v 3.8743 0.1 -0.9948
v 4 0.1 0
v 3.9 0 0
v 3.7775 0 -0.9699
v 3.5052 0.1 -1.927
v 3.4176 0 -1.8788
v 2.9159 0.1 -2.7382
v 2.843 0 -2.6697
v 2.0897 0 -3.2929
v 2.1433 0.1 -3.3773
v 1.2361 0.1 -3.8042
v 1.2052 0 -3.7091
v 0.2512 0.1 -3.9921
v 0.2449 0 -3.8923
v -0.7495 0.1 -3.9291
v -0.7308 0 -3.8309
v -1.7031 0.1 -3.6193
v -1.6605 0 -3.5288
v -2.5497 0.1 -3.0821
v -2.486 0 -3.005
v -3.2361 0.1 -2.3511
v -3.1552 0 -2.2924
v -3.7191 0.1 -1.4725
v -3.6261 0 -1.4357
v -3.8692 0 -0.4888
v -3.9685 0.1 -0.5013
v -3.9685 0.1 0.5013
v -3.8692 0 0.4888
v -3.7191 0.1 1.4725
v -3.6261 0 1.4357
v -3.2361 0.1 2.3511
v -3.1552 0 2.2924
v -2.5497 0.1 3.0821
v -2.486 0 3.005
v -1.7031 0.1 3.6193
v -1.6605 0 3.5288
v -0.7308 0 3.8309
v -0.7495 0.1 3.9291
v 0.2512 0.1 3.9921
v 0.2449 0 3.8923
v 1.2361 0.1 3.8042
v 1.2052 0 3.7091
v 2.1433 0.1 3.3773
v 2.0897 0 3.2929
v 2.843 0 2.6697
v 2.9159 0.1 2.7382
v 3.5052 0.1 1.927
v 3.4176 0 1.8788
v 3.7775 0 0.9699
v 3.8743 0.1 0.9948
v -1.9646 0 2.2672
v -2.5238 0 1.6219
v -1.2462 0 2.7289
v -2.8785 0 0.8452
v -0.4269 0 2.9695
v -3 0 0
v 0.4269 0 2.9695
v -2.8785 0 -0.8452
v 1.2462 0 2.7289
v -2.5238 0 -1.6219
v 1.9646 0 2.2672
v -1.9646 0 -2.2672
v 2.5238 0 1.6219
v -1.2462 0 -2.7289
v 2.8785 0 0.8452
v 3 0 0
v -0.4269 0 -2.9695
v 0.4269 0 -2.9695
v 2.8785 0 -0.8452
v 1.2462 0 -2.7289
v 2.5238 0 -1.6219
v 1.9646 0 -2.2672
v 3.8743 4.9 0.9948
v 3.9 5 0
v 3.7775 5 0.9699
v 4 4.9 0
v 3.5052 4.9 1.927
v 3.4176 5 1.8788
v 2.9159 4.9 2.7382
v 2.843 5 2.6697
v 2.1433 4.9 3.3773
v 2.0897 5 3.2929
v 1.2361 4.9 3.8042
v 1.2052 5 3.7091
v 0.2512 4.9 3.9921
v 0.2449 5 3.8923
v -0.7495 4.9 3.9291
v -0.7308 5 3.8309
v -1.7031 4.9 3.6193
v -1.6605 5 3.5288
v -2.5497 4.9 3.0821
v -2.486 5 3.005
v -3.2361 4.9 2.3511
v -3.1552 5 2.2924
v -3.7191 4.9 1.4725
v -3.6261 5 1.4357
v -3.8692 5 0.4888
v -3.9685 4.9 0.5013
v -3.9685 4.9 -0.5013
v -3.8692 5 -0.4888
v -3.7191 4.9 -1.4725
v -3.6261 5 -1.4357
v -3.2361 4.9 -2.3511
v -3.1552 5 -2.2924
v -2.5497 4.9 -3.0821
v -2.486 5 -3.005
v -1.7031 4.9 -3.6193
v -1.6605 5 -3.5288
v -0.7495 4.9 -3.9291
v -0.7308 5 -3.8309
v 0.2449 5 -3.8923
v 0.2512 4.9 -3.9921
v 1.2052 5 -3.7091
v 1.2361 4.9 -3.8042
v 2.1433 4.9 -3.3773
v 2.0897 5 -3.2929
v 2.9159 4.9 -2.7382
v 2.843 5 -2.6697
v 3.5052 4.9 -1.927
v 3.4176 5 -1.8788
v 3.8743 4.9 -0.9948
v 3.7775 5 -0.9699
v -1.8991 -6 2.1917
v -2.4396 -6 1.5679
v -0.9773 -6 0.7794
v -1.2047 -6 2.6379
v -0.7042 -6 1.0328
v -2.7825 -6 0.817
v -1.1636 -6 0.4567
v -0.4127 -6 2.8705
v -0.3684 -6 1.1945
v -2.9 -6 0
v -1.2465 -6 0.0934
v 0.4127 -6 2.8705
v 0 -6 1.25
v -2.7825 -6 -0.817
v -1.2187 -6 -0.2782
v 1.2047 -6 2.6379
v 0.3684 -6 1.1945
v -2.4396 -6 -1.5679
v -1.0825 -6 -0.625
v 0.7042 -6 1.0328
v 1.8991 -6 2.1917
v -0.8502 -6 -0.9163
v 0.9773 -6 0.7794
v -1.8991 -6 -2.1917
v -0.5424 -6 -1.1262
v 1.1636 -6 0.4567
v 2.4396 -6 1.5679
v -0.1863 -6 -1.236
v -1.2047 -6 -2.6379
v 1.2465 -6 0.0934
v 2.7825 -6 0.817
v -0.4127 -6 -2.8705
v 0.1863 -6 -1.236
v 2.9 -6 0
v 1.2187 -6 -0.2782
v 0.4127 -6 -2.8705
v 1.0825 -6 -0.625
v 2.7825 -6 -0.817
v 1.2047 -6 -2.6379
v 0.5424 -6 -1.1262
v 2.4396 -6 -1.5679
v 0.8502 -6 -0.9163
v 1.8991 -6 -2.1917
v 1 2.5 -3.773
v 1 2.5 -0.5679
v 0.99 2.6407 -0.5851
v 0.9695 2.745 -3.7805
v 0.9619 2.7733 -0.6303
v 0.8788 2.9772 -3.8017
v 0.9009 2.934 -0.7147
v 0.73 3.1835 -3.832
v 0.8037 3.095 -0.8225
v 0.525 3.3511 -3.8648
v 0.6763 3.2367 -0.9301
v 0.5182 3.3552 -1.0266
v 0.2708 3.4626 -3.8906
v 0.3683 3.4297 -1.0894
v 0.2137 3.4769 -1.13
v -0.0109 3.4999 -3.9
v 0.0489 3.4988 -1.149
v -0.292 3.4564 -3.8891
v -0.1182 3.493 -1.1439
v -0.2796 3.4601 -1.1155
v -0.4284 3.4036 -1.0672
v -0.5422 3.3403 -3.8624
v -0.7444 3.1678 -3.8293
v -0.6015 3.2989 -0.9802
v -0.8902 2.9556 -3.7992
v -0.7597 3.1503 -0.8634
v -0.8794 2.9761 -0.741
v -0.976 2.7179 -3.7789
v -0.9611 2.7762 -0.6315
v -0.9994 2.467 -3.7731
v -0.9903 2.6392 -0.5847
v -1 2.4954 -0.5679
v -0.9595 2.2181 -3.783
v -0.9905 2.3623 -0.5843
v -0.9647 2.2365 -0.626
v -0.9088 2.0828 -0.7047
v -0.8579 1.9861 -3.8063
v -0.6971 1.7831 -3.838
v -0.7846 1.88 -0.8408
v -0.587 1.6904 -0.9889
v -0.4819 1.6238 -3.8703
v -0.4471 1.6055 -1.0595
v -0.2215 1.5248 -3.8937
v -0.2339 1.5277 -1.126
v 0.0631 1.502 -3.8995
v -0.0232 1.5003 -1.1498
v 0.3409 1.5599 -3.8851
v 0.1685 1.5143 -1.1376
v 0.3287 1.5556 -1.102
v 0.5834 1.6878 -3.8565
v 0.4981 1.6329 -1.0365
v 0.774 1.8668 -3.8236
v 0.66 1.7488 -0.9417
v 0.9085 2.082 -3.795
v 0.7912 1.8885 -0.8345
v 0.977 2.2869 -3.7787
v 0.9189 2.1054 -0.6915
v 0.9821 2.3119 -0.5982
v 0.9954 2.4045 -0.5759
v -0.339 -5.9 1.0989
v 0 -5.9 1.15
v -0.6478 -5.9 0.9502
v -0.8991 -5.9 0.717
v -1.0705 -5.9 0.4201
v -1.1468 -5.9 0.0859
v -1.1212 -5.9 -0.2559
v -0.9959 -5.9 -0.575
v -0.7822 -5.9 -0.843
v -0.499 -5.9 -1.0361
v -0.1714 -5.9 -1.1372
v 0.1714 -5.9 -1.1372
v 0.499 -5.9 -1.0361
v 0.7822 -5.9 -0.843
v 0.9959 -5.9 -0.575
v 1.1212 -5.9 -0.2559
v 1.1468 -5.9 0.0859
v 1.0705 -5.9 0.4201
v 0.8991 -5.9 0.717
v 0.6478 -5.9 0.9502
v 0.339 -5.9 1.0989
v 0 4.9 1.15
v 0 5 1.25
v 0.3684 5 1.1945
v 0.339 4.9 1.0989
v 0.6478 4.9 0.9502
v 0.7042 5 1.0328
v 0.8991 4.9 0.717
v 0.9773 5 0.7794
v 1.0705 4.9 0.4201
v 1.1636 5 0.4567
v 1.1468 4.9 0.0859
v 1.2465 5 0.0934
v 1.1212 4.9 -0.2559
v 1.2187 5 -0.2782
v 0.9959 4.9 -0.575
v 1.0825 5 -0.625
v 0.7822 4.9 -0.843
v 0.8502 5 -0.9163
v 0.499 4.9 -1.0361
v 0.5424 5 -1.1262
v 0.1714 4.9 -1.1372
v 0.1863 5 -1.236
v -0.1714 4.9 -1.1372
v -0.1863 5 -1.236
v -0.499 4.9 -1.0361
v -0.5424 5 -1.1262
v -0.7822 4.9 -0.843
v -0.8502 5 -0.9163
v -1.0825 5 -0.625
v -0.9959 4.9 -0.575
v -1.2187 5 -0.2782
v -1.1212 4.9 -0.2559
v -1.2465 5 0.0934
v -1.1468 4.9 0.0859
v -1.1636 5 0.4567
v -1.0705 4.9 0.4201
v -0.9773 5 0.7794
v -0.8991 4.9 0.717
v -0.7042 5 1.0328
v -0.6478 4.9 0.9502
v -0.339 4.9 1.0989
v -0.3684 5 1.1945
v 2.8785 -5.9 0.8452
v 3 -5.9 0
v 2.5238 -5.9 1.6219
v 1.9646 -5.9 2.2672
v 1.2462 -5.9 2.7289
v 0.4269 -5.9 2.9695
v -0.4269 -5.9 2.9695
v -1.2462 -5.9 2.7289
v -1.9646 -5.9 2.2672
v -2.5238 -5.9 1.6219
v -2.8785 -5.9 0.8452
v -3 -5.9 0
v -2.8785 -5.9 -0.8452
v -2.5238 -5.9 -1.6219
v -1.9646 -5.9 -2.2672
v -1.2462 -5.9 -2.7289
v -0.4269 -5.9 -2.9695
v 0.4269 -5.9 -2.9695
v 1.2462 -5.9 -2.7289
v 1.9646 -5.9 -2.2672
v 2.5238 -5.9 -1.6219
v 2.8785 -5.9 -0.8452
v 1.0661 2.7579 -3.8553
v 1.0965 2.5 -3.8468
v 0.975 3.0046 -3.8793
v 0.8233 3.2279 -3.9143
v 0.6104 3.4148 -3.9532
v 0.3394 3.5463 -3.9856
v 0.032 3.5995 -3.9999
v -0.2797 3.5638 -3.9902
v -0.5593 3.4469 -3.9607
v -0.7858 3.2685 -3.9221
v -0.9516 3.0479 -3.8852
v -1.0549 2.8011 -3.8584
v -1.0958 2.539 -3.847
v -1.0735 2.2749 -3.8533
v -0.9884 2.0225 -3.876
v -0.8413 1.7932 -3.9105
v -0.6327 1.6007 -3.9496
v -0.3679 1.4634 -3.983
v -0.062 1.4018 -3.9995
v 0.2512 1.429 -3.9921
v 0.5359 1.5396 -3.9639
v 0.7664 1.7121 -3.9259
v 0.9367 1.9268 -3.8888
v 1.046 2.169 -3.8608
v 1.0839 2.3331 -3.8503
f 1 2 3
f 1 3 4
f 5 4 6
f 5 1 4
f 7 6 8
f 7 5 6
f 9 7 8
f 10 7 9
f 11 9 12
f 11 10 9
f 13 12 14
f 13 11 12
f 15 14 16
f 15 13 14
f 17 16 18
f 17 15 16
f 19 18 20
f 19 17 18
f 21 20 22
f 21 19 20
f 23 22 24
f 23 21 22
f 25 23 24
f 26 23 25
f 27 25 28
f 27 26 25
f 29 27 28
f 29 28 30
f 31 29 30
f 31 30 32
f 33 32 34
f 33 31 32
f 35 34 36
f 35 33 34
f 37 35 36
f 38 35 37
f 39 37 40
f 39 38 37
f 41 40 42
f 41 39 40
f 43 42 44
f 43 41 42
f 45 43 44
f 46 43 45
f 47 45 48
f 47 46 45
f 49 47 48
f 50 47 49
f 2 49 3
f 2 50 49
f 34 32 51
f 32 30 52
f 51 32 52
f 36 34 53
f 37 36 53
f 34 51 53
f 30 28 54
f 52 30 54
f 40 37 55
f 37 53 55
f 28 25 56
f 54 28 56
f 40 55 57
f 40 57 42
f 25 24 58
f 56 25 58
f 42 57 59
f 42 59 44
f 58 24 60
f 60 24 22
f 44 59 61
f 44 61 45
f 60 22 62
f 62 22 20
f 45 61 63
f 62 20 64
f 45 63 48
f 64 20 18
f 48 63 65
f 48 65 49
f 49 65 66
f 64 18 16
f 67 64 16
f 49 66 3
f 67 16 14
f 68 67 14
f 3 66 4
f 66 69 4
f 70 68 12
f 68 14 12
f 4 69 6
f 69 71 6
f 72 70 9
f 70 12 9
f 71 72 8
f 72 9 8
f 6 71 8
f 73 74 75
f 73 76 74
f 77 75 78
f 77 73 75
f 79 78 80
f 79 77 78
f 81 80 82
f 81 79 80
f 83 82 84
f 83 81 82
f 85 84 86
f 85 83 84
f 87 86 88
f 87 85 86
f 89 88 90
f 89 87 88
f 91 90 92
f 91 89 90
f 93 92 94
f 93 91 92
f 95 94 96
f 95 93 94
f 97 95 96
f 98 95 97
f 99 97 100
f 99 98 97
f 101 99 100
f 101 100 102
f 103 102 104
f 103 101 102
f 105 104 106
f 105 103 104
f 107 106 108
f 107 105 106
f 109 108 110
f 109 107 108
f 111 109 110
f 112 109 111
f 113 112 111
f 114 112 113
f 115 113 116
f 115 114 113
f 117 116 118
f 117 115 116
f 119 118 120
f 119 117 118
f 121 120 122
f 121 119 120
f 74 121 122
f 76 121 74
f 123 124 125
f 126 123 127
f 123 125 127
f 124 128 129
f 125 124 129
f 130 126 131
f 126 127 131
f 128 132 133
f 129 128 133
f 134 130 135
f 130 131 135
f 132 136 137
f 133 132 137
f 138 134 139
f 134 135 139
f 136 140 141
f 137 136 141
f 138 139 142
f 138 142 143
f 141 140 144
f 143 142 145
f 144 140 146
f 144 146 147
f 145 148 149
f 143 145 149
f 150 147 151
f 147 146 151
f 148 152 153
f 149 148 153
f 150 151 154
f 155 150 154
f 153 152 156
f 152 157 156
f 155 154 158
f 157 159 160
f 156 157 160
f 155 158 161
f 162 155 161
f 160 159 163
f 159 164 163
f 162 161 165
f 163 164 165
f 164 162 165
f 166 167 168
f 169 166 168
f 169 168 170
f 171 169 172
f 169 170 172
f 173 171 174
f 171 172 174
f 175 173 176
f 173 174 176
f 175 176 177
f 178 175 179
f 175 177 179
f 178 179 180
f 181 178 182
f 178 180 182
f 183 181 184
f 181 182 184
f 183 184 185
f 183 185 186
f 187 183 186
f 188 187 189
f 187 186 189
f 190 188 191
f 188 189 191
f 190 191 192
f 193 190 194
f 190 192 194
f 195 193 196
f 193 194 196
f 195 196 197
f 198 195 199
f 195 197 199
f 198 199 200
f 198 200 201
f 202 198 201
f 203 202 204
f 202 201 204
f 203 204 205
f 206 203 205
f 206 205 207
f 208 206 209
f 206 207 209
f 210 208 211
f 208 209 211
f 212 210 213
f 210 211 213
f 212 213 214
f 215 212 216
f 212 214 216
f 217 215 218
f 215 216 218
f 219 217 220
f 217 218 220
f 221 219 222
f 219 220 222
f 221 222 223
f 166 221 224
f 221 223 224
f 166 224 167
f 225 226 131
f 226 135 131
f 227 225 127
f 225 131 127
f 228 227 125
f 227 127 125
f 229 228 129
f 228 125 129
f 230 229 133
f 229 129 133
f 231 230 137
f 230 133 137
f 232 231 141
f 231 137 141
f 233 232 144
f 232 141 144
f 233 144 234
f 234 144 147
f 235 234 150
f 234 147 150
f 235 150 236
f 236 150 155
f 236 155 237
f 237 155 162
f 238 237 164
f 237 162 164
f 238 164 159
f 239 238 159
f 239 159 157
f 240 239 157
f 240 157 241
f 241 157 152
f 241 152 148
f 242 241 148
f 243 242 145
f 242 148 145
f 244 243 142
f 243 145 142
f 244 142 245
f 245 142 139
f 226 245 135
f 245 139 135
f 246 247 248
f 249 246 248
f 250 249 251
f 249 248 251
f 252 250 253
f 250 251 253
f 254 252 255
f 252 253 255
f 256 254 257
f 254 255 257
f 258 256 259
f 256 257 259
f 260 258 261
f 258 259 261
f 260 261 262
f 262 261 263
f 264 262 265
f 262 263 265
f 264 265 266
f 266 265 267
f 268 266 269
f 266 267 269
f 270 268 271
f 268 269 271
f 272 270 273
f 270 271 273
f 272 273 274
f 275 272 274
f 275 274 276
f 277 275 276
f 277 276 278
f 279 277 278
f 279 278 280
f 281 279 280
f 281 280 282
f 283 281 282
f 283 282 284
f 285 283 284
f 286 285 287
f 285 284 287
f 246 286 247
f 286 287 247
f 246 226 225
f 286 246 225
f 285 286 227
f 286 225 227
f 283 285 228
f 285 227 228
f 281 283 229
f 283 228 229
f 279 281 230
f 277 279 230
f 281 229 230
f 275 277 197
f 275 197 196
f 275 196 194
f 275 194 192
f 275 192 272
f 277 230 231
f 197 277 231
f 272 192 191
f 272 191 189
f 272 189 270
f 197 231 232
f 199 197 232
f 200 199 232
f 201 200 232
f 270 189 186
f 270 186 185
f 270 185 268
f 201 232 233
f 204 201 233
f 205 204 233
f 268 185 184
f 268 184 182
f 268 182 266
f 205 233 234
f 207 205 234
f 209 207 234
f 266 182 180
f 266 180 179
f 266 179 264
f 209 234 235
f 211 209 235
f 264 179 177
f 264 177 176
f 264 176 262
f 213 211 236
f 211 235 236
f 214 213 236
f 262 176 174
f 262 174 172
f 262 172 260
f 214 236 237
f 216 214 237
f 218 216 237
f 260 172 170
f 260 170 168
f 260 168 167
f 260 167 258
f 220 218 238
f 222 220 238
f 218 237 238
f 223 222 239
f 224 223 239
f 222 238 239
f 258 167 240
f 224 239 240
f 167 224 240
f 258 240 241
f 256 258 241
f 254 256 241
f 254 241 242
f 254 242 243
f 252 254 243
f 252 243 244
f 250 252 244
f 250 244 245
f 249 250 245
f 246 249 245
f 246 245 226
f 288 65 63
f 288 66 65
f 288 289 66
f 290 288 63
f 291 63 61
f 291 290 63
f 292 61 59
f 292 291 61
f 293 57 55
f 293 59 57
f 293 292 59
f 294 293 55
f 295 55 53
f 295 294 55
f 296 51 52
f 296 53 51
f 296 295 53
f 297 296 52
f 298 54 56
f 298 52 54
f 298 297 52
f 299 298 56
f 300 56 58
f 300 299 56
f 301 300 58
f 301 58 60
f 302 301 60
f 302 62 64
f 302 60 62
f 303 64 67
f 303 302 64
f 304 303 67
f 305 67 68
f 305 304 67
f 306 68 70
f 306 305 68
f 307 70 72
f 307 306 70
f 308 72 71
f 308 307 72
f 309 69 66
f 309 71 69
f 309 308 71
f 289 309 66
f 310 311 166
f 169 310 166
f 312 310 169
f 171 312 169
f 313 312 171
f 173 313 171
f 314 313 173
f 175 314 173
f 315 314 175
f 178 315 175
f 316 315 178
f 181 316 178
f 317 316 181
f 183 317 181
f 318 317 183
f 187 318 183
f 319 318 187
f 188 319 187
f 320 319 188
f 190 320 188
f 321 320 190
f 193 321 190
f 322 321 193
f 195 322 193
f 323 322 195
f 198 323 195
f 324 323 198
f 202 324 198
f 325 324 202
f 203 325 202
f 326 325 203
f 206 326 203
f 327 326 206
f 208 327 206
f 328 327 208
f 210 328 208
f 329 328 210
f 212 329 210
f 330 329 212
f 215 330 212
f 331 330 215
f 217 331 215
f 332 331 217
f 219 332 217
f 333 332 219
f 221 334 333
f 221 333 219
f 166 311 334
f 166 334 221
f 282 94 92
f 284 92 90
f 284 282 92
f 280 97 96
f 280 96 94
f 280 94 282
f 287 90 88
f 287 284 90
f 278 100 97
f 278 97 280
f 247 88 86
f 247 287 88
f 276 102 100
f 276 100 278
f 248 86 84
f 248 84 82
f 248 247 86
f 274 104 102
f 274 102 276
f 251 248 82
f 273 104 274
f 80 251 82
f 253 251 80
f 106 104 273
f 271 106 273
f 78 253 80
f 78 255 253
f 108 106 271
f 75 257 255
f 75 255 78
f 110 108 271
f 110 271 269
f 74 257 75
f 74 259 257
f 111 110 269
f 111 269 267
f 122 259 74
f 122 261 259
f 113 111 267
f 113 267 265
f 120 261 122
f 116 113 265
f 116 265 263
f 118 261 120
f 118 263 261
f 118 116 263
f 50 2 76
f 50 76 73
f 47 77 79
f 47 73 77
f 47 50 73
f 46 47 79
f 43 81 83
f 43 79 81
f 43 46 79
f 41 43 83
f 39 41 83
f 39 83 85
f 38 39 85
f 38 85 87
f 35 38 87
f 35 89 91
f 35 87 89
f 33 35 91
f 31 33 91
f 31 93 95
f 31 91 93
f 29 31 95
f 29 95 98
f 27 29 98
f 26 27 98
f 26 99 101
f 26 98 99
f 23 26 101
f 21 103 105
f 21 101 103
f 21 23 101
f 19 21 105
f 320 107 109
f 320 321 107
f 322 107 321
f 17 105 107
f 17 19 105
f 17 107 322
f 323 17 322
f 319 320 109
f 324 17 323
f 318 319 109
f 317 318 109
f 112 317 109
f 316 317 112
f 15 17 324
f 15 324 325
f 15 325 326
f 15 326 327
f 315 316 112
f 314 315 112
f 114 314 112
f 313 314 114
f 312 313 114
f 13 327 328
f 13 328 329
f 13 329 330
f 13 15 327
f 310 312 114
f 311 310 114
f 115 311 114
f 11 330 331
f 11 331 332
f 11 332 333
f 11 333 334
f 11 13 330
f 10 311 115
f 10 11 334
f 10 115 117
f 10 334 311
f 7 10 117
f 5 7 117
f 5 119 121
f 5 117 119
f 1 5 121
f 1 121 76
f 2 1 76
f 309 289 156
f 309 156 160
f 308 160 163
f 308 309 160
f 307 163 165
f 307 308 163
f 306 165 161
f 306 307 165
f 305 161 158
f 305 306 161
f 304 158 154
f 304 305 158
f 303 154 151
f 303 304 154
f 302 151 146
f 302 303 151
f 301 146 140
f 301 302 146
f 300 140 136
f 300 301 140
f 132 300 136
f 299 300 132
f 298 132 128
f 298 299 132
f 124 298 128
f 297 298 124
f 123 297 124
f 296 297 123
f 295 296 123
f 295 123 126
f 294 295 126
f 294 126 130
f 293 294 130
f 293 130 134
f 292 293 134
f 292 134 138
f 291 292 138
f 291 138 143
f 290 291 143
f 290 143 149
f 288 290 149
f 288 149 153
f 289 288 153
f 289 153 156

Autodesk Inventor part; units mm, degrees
ref_plane "YZ Plane" through (0, 0, 0) normal (1, 0, 0) x (0, 1, 0)
ref_plane "XZ Plane" through (0, 0, 0) normal (0, 1, 0) x (-1, 0, 0)
ref_plane "XY Plane" through (0, 0, 0) normal (0, 0, 1) x (1, 0, 0)
sketch "Skizze1" plane through (0, 0, 0) normal (0, 0, 1) x (1, 0, 0)
  line L0 (0, 5) -> (4, 5)
  line L1 (4, 5) -> (4, 0)
  line L2 (4, 0) -> (3, 0)
  line L3 (3, 0) -> (3, -6)
  line L4 (3, -6) -> (0, -6)
  line L5 (0, -6) -> (0, 5)
  point P0 (0, 0)
  dimension "d0" = 6
  dimension "d1" = 6
  dimension "d2" = 8
  dimension "d3" = 5
revolve "Umdrehung1" add sketch "Skizze1" angle 360 about axis through (0, -6, 0) along (0, 1, 0)
chamfer "Fase1" distance 0.1 angle 45 3 edges at (-4, 5, 0) (-3, -6, 0) (-4, 0, 0)
hole "Bohrung1" at (0, 5, 0) direction (0, -1, 0) diameter 2.3 end through all both
chamfer "Fase2" distance 0.1 angle 45 2 edges at (0, -6, -1.15) (0, 5, -1.15)
sketch "Skizze2" plane through (0, 0, 0) normal (0, 0, 1) x (1, 0, 0)
  circle A0 centre (0, 2.5) radius 1
  line L0 (1.25, 5) -> (-1.25, 5)
  line L1 (0, 7.2) -> (0, -8.2)
  point P0 (0, 0)
  dimension "d20" = 2
  dimension "d21" = 2.5
extrude "Extrusion1" cut sketch "Skizze2" against normal blind 10
chamfer "Fase3" distance 0.1 angle 45 1 edges at (-1, 2.5012, -3.873)
thread "Gewinde1"
properties part number "nabe" material "Aluminium 6061"
